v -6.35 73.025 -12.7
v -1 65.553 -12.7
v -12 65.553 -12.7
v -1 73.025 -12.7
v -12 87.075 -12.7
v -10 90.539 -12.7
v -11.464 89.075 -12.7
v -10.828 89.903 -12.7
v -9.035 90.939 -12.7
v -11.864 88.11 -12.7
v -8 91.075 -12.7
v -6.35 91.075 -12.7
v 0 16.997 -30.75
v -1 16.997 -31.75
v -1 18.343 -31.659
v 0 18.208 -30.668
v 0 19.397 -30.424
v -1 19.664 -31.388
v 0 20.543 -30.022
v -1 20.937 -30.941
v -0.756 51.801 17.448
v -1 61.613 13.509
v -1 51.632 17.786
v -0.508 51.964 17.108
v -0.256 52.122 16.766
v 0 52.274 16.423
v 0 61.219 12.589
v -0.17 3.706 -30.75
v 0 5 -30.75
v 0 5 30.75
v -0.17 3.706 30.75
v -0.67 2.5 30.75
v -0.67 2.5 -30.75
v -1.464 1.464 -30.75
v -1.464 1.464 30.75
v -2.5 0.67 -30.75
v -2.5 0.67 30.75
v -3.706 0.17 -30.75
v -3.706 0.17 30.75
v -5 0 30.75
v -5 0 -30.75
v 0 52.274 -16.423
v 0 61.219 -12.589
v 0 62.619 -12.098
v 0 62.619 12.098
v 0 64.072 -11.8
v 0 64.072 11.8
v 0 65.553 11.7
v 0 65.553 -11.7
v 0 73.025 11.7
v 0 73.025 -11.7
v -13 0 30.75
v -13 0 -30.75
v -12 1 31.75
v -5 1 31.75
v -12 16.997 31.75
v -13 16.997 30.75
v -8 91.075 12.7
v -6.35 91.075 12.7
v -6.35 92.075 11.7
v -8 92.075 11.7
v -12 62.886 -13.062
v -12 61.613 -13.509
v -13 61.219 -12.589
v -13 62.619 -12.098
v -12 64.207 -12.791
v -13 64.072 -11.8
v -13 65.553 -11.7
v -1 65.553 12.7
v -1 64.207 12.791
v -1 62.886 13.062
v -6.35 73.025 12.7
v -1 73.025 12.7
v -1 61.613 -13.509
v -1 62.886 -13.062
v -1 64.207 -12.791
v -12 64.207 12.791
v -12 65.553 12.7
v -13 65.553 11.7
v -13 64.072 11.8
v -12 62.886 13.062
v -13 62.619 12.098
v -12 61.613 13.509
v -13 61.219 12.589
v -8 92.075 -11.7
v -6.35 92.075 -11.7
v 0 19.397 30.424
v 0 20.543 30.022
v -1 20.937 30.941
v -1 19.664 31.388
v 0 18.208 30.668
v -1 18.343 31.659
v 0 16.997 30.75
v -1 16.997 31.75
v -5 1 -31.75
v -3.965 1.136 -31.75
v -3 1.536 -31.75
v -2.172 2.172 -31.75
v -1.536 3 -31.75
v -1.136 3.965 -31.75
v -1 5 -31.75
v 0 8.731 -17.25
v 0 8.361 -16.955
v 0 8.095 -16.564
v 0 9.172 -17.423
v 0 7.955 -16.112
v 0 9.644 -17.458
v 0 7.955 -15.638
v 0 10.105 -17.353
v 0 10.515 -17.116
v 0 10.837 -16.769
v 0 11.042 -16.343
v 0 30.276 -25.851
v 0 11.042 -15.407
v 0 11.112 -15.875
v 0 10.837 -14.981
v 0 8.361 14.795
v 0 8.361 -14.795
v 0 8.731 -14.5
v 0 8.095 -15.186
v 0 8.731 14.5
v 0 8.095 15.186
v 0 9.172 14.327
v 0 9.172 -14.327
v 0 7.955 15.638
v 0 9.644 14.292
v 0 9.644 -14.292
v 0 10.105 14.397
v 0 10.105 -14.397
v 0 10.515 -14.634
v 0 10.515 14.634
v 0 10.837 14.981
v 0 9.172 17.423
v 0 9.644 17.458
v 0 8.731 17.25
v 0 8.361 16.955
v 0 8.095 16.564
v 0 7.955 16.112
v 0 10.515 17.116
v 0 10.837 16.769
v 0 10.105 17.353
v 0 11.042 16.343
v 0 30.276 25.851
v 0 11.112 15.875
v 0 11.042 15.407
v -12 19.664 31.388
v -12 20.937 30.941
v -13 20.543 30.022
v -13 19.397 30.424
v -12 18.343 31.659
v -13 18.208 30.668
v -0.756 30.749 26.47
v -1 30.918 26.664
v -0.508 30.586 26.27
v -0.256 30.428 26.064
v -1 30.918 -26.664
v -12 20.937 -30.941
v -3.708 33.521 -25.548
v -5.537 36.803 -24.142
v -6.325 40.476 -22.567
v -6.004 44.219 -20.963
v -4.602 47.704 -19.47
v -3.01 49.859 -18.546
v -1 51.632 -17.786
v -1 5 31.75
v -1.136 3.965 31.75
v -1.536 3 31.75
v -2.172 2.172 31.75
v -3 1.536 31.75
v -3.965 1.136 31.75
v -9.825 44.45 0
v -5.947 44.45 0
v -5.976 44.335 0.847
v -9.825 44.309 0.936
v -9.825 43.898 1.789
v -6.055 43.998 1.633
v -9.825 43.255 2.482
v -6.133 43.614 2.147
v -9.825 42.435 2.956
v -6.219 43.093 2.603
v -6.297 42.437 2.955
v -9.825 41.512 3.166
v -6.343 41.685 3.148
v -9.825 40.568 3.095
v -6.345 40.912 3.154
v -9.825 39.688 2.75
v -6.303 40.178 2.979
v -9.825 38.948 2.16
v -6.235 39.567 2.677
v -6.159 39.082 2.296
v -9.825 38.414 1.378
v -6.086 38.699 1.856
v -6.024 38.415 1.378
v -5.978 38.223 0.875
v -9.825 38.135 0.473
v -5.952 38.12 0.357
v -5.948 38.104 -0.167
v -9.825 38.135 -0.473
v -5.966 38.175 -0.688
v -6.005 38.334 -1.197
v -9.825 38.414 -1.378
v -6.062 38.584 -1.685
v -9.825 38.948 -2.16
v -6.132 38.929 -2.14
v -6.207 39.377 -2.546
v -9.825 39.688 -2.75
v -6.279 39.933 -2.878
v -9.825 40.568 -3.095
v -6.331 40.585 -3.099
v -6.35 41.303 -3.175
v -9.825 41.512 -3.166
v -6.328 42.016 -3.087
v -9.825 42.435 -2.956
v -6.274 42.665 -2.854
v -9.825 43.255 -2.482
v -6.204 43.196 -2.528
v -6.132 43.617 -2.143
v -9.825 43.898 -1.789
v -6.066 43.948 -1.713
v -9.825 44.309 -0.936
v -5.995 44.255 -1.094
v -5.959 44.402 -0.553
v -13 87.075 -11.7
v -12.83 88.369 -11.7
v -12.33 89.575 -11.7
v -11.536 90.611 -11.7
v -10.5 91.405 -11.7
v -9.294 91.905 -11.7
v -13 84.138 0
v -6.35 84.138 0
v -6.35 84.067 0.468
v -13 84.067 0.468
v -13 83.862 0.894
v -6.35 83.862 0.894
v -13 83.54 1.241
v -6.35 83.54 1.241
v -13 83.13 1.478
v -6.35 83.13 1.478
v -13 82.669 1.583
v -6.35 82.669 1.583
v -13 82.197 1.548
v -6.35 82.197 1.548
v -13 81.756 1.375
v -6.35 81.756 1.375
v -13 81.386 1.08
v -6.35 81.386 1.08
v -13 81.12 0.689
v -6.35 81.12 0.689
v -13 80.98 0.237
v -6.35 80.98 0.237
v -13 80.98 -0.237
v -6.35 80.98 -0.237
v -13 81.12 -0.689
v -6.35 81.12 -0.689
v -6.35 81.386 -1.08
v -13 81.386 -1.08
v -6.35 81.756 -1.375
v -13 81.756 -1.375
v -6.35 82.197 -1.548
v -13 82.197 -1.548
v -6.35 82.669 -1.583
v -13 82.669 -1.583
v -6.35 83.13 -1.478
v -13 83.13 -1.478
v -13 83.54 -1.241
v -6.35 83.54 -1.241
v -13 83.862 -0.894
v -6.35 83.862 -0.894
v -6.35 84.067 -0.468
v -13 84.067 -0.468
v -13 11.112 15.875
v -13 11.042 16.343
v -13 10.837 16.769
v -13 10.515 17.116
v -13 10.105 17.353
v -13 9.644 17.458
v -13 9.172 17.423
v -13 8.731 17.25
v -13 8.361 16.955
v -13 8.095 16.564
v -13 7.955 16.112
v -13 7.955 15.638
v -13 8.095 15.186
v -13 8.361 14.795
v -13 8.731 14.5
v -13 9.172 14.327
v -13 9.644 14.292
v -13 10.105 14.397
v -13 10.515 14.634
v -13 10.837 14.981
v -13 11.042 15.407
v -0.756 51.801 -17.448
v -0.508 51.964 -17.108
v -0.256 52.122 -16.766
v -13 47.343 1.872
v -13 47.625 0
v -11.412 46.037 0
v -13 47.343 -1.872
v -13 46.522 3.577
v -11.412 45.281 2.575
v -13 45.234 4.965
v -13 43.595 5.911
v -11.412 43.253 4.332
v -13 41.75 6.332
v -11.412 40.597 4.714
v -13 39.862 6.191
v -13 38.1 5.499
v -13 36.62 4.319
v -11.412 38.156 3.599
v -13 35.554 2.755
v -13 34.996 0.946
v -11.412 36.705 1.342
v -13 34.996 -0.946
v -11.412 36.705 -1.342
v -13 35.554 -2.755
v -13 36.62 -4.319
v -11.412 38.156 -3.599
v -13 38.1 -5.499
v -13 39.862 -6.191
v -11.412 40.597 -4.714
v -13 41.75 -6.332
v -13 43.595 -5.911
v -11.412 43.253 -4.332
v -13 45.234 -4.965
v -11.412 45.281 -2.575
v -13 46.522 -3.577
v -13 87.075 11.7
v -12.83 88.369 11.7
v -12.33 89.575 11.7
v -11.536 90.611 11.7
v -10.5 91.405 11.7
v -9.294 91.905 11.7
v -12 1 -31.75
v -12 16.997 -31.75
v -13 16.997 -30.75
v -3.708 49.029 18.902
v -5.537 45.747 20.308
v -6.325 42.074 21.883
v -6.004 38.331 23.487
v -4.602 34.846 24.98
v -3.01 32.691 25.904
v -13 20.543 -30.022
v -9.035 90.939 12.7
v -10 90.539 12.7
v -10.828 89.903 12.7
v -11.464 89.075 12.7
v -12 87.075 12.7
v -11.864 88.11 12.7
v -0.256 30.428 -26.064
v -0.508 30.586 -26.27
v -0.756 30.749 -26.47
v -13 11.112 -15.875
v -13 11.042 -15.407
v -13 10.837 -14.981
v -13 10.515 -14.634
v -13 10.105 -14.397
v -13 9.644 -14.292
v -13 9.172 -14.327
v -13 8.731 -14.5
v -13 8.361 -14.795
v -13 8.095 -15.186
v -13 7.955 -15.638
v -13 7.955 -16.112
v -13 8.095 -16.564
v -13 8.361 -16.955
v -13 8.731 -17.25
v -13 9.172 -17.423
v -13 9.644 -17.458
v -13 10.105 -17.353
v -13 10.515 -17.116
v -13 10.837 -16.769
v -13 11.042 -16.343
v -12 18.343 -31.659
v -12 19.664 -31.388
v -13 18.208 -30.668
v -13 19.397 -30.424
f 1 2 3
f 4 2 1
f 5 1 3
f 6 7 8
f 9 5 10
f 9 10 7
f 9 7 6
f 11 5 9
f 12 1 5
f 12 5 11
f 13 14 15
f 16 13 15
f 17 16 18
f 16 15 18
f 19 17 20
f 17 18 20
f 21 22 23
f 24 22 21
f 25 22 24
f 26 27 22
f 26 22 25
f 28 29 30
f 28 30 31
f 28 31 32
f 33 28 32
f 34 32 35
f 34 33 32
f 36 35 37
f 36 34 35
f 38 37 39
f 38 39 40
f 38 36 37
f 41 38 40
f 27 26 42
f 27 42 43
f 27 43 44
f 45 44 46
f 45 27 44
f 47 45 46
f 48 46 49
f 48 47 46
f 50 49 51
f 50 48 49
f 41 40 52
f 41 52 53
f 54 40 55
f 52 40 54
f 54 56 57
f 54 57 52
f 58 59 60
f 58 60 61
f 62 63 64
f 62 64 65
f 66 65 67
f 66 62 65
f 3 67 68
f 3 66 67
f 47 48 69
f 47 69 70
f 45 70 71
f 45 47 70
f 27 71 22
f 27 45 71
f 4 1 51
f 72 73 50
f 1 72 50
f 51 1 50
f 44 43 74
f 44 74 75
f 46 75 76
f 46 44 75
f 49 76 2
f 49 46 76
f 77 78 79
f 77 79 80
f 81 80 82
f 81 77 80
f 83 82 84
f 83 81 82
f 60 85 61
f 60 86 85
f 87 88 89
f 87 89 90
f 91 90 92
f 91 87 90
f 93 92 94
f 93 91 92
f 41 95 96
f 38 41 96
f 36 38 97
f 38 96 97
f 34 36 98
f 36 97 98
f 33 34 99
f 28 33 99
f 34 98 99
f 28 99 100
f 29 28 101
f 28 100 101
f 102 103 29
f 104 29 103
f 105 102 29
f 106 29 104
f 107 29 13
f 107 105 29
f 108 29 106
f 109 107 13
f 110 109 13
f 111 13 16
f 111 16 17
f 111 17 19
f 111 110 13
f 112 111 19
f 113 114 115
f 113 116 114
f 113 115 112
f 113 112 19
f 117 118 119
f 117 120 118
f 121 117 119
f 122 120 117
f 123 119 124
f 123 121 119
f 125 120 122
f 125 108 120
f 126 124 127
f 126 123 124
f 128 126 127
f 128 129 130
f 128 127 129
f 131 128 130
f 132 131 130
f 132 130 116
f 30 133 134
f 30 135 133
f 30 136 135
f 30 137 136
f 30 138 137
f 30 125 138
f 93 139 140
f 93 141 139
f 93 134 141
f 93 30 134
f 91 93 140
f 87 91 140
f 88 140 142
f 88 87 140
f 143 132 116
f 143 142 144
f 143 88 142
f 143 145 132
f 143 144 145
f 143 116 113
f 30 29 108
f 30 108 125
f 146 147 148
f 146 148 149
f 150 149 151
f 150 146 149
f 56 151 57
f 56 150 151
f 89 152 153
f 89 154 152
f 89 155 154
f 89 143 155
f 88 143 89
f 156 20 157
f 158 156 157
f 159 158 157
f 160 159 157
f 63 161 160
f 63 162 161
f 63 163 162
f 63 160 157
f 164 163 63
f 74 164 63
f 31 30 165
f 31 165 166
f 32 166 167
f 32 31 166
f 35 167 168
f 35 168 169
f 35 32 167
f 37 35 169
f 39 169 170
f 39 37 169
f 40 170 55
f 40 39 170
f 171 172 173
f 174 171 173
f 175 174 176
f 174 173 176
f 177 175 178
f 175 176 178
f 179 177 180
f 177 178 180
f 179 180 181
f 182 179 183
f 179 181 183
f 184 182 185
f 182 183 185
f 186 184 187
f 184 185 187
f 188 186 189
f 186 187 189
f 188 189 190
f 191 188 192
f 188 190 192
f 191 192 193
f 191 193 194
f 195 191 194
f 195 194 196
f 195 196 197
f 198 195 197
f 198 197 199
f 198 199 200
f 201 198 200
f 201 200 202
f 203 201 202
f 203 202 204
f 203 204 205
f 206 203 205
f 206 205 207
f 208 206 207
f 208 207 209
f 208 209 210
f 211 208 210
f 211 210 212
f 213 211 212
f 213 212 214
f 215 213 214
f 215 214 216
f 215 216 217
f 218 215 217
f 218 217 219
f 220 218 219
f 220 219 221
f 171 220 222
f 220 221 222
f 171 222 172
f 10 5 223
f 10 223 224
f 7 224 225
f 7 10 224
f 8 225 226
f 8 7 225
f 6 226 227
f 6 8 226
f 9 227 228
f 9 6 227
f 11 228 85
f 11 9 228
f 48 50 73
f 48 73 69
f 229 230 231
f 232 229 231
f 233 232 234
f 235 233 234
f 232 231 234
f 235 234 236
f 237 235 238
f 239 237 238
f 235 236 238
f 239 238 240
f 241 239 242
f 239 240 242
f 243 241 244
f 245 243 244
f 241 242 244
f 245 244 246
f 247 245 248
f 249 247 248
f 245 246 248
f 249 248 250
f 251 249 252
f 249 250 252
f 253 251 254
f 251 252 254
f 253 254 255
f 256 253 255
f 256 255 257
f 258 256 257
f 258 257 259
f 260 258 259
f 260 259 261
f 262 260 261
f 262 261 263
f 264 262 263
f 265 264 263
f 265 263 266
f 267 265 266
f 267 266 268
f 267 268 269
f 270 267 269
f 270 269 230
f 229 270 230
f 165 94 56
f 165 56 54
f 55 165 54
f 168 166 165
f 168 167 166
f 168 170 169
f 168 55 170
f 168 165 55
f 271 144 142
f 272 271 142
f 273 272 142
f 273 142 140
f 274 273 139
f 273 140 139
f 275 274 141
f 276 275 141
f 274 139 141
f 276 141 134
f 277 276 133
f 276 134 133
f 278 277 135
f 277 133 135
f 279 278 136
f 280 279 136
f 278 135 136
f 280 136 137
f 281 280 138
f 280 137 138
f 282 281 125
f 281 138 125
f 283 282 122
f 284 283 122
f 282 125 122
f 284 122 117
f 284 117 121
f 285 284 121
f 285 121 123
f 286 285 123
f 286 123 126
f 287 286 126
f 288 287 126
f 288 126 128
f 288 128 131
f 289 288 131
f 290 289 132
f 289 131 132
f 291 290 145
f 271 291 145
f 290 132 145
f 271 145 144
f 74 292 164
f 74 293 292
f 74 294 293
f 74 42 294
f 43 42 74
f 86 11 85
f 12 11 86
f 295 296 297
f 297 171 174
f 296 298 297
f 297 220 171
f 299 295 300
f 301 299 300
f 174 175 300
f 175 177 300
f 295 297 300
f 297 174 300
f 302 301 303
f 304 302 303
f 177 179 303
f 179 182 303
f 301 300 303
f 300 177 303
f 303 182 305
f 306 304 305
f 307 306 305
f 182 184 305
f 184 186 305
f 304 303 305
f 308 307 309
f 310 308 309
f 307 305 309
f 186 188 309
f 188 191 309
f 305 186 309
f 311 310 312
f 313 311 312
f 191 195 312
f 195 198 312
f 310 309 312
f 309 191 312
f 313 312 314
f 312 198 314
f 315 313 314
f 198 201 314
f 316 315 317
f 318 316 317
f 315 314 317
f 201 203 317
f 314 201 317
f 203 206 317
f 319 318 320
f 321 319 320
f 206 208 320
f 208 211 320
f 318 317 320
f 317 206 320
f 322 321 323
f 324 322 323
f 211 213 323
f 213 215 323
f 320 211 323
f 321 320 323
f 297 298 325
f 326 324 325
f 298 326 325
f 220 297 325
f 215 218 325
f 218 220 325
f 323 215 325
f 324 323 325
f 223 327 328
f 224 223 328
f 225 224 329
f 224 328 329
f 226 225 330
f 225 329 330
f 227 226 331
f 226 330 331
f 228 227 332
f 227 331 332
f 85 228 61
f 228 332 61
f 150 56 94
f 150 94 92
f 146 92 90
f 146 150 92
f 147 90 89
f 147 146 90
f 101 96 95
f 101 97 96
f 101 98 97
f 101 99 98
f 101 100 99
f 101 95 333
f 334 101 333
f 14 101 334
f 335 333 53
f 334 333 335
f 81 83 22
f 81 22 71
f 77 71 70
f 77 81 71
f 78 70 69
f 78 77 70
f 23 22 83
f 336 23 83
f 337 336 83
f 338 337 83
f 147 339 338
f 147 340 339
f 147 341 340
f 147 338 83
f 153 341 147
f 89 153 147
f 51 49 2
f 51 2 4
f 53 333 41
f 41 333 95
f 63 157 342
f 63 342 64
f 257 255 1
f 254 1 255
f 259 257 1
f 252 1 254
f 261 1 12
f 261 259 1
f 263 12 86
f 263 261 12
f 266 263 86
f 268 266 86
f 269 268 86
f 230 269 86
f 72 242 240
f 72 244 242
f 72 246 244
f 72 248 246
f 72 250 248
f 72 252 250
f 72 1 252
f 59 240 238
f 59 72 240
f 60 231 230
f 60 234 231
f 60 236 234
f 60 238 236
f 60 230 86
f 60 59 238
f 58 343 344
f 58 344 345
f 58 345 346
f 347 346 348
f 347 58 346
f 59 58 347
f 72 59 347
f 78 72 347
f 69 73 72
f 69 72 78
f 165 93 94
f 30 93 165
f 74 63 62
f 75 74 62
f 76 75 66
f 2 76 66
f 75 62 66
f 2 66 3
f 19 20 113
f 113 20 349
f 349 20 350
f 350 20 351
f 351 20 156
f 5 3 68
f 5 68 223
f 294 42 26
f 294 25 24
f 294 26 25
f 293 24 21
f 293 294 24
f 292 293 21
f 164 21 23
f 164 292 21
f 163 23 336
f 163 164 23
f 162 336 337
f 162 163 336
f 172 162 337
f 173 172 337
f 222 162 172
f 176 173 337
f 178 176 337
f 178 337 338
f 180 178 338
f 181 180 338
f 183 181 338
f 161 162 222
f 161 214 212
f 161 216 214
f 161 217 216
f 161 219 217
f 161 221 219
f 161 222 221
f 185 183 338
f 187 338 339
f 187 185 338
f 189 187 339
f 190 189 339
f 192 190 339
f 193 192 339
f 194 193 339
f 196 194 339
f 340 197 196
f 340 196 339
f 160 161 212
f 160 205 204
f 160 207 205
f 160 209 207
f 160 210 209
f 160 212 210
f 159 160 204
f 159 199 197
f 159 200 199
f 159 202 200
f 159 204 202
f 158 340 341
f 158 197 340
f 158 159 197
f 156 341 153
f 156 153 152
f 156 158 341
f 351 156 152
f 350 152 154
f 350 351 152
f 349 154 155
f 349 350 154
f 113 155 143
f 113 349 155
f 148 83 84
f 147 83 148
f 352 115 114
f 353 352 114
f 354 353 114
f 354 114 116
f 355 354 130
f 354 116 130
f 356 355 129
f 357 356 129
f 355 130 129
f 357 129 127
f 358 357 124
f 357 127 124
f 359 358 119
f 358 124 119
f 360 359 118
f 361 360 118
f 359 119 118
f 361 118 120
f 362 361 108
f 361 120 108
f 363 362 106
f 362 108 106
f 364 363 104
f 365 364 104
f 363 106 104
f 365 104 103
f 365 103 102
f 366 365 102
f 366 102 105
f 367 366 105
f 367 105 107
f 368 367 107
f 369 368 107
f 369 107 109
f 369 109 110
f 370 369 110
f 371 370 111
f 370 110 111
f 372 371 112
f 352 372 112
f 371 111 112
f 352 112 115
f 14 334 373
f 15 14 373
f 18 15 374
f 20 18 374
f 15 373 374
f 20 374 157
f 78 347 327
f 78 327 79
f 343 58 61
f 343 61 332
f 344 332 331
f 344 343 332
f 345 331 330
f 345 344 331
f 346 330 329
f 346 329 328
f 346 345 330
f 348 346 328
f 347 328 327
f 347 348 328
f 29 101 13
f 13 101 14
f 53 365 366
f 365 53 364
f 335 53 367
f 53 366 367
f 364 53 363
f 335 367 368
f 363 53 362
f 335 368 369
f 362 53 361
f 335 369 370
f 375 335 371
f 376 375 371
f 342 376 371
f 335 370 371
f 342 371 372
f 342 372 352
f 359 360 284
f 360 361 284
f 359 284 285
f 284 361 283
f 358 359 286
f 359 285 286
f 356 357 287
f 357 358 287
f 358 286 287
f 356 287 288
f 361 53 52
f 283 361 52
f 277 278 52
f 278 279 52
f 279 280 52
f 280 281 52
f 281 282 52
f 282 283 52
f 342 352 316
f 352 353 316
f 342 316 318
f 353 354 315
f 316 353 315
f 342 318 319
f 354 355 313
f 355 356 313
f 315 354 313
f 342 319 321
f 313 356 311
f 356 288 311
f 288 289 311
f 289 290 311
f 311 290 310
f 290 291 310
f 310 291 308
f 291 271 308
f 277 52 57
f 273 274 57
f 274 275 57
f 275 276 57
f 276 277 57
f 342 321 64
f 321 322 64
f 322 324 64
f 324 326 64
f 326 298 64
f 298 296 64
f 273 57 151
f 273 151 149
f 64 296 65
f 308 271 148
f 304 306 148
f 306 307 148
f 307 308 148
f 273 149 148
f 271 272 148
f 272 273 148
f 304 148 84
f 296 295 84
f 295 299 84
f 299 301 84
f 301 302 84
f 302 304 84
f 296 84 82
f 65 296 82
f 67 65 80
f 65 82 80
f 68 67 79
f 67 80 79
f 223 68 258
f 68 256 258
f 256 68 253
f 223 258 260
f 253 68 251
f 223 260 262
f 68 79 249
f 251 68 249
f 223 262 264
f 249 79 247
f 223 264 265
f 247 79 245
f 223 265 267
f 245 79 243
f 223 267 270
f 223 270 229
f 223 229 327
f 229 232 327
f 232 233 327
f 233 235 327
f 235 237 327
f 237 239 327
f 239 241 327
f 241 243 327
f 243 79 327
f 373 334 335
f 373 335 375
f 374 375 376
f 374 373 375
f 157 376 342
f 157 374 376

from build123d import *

# Parameters (mm, degrees)
F0_R     = 1.5875
F0_R_2   = 3.175
F1_DEPTH = 13
F2_W     = 6.35
F2_H     = 19.05
F3_DEPTH = 37.5
F4_R     = 10
F5_R     = 5
F6_SIZE  = 1
F7_SIZE  = 3.175


with BuildPart() as f1:
    # F0 (on Right) → F1 (new body)
    with BuildSketch(Plane.YZ):
        Polygon((0, 31.75), (0, 0), (0, -31.75), (19.05, -31.75), (63.5, -12.7), (92.075, -12.7), (92.075, 0), (92.075, 12.7), (63.5, 12.7), (19.05, 31.75), align=None)
        with Locations((9.525, -15.875)):
            Circle(F0_R, mode=Mode.SUBTRACT)
        with Locations((41.275, 0)):
            Circle(F0_R_2, mode=Mode.SUBTRACT)
        with Locations((9.525, 15.875)):
            Circle(F0_R, mode=Mode.SUBTRACT)
        with Locations((82.55, 0)):
            Circle(F0_R, mode=Mode.SUBTRACT)
    extrude(amount=-F1_DEPTH)

    # F2 (on Top) → F3 (cut, symmetric)
    with BuildSketch(Plane.XY):
        with BuildLine():
            Line((0, 30.276477), (0, 52.273523))
            ThreePointArc((0, 52.273523), (-6.35, 41.275), (0, 30.276477))
        make_face()
        with Locations((-3.175, 82.55)):
            Rectangle(F2_W, F2_H)
    extrude(amount=F3_DEPTH, both=True, mode=Mode.SUBTRACT)

    # F4
    f4_edges = [f1.edges().sort_by_distance(p)[0] for p in [
        (-6.5, 19.05, 31.75),
        (-6.5, 63.5, 12.7),
        (-6.5, 63.5, -12.7),
        (-6.5, 19.05, -31.75),
    ]]
    fillet(f4_edges, radius=F4_R)

    # F5
    f5_edges = [f1.edges().sort_by_distance(p)[0] for p in [
        (-13, 92.075, 0),
        (0, 0, 0),
    ]]
    fillet(f5_edges, radius=F5_R)

    # F6
    f6_edges = [f1.edges().sort_by_distance(p)[0] for p in [
        (-13, 76.313789, 12.7),
        (0, 10.998711, 31.75),
        (0, 25.606547, 28.940051),
        (0, 56.943453, 15.509949),
        (0, 69.288789, -12.7),
        (0, 25.606547, -28.940051),
        (0, 56.943453, -15.509949),
        (-13, 76.313789, -12.7),
    ]]
    chamfer(f6_edges, length=F6_SIZE)

    # F7
    f7_edges = [f1.edges().sort_by_distance(p)[0] for p in [
        (-13, 38.1, 0),
    ]]
    chamfer(f7_edges, length=F7_SIZE)


solid = f1.part
